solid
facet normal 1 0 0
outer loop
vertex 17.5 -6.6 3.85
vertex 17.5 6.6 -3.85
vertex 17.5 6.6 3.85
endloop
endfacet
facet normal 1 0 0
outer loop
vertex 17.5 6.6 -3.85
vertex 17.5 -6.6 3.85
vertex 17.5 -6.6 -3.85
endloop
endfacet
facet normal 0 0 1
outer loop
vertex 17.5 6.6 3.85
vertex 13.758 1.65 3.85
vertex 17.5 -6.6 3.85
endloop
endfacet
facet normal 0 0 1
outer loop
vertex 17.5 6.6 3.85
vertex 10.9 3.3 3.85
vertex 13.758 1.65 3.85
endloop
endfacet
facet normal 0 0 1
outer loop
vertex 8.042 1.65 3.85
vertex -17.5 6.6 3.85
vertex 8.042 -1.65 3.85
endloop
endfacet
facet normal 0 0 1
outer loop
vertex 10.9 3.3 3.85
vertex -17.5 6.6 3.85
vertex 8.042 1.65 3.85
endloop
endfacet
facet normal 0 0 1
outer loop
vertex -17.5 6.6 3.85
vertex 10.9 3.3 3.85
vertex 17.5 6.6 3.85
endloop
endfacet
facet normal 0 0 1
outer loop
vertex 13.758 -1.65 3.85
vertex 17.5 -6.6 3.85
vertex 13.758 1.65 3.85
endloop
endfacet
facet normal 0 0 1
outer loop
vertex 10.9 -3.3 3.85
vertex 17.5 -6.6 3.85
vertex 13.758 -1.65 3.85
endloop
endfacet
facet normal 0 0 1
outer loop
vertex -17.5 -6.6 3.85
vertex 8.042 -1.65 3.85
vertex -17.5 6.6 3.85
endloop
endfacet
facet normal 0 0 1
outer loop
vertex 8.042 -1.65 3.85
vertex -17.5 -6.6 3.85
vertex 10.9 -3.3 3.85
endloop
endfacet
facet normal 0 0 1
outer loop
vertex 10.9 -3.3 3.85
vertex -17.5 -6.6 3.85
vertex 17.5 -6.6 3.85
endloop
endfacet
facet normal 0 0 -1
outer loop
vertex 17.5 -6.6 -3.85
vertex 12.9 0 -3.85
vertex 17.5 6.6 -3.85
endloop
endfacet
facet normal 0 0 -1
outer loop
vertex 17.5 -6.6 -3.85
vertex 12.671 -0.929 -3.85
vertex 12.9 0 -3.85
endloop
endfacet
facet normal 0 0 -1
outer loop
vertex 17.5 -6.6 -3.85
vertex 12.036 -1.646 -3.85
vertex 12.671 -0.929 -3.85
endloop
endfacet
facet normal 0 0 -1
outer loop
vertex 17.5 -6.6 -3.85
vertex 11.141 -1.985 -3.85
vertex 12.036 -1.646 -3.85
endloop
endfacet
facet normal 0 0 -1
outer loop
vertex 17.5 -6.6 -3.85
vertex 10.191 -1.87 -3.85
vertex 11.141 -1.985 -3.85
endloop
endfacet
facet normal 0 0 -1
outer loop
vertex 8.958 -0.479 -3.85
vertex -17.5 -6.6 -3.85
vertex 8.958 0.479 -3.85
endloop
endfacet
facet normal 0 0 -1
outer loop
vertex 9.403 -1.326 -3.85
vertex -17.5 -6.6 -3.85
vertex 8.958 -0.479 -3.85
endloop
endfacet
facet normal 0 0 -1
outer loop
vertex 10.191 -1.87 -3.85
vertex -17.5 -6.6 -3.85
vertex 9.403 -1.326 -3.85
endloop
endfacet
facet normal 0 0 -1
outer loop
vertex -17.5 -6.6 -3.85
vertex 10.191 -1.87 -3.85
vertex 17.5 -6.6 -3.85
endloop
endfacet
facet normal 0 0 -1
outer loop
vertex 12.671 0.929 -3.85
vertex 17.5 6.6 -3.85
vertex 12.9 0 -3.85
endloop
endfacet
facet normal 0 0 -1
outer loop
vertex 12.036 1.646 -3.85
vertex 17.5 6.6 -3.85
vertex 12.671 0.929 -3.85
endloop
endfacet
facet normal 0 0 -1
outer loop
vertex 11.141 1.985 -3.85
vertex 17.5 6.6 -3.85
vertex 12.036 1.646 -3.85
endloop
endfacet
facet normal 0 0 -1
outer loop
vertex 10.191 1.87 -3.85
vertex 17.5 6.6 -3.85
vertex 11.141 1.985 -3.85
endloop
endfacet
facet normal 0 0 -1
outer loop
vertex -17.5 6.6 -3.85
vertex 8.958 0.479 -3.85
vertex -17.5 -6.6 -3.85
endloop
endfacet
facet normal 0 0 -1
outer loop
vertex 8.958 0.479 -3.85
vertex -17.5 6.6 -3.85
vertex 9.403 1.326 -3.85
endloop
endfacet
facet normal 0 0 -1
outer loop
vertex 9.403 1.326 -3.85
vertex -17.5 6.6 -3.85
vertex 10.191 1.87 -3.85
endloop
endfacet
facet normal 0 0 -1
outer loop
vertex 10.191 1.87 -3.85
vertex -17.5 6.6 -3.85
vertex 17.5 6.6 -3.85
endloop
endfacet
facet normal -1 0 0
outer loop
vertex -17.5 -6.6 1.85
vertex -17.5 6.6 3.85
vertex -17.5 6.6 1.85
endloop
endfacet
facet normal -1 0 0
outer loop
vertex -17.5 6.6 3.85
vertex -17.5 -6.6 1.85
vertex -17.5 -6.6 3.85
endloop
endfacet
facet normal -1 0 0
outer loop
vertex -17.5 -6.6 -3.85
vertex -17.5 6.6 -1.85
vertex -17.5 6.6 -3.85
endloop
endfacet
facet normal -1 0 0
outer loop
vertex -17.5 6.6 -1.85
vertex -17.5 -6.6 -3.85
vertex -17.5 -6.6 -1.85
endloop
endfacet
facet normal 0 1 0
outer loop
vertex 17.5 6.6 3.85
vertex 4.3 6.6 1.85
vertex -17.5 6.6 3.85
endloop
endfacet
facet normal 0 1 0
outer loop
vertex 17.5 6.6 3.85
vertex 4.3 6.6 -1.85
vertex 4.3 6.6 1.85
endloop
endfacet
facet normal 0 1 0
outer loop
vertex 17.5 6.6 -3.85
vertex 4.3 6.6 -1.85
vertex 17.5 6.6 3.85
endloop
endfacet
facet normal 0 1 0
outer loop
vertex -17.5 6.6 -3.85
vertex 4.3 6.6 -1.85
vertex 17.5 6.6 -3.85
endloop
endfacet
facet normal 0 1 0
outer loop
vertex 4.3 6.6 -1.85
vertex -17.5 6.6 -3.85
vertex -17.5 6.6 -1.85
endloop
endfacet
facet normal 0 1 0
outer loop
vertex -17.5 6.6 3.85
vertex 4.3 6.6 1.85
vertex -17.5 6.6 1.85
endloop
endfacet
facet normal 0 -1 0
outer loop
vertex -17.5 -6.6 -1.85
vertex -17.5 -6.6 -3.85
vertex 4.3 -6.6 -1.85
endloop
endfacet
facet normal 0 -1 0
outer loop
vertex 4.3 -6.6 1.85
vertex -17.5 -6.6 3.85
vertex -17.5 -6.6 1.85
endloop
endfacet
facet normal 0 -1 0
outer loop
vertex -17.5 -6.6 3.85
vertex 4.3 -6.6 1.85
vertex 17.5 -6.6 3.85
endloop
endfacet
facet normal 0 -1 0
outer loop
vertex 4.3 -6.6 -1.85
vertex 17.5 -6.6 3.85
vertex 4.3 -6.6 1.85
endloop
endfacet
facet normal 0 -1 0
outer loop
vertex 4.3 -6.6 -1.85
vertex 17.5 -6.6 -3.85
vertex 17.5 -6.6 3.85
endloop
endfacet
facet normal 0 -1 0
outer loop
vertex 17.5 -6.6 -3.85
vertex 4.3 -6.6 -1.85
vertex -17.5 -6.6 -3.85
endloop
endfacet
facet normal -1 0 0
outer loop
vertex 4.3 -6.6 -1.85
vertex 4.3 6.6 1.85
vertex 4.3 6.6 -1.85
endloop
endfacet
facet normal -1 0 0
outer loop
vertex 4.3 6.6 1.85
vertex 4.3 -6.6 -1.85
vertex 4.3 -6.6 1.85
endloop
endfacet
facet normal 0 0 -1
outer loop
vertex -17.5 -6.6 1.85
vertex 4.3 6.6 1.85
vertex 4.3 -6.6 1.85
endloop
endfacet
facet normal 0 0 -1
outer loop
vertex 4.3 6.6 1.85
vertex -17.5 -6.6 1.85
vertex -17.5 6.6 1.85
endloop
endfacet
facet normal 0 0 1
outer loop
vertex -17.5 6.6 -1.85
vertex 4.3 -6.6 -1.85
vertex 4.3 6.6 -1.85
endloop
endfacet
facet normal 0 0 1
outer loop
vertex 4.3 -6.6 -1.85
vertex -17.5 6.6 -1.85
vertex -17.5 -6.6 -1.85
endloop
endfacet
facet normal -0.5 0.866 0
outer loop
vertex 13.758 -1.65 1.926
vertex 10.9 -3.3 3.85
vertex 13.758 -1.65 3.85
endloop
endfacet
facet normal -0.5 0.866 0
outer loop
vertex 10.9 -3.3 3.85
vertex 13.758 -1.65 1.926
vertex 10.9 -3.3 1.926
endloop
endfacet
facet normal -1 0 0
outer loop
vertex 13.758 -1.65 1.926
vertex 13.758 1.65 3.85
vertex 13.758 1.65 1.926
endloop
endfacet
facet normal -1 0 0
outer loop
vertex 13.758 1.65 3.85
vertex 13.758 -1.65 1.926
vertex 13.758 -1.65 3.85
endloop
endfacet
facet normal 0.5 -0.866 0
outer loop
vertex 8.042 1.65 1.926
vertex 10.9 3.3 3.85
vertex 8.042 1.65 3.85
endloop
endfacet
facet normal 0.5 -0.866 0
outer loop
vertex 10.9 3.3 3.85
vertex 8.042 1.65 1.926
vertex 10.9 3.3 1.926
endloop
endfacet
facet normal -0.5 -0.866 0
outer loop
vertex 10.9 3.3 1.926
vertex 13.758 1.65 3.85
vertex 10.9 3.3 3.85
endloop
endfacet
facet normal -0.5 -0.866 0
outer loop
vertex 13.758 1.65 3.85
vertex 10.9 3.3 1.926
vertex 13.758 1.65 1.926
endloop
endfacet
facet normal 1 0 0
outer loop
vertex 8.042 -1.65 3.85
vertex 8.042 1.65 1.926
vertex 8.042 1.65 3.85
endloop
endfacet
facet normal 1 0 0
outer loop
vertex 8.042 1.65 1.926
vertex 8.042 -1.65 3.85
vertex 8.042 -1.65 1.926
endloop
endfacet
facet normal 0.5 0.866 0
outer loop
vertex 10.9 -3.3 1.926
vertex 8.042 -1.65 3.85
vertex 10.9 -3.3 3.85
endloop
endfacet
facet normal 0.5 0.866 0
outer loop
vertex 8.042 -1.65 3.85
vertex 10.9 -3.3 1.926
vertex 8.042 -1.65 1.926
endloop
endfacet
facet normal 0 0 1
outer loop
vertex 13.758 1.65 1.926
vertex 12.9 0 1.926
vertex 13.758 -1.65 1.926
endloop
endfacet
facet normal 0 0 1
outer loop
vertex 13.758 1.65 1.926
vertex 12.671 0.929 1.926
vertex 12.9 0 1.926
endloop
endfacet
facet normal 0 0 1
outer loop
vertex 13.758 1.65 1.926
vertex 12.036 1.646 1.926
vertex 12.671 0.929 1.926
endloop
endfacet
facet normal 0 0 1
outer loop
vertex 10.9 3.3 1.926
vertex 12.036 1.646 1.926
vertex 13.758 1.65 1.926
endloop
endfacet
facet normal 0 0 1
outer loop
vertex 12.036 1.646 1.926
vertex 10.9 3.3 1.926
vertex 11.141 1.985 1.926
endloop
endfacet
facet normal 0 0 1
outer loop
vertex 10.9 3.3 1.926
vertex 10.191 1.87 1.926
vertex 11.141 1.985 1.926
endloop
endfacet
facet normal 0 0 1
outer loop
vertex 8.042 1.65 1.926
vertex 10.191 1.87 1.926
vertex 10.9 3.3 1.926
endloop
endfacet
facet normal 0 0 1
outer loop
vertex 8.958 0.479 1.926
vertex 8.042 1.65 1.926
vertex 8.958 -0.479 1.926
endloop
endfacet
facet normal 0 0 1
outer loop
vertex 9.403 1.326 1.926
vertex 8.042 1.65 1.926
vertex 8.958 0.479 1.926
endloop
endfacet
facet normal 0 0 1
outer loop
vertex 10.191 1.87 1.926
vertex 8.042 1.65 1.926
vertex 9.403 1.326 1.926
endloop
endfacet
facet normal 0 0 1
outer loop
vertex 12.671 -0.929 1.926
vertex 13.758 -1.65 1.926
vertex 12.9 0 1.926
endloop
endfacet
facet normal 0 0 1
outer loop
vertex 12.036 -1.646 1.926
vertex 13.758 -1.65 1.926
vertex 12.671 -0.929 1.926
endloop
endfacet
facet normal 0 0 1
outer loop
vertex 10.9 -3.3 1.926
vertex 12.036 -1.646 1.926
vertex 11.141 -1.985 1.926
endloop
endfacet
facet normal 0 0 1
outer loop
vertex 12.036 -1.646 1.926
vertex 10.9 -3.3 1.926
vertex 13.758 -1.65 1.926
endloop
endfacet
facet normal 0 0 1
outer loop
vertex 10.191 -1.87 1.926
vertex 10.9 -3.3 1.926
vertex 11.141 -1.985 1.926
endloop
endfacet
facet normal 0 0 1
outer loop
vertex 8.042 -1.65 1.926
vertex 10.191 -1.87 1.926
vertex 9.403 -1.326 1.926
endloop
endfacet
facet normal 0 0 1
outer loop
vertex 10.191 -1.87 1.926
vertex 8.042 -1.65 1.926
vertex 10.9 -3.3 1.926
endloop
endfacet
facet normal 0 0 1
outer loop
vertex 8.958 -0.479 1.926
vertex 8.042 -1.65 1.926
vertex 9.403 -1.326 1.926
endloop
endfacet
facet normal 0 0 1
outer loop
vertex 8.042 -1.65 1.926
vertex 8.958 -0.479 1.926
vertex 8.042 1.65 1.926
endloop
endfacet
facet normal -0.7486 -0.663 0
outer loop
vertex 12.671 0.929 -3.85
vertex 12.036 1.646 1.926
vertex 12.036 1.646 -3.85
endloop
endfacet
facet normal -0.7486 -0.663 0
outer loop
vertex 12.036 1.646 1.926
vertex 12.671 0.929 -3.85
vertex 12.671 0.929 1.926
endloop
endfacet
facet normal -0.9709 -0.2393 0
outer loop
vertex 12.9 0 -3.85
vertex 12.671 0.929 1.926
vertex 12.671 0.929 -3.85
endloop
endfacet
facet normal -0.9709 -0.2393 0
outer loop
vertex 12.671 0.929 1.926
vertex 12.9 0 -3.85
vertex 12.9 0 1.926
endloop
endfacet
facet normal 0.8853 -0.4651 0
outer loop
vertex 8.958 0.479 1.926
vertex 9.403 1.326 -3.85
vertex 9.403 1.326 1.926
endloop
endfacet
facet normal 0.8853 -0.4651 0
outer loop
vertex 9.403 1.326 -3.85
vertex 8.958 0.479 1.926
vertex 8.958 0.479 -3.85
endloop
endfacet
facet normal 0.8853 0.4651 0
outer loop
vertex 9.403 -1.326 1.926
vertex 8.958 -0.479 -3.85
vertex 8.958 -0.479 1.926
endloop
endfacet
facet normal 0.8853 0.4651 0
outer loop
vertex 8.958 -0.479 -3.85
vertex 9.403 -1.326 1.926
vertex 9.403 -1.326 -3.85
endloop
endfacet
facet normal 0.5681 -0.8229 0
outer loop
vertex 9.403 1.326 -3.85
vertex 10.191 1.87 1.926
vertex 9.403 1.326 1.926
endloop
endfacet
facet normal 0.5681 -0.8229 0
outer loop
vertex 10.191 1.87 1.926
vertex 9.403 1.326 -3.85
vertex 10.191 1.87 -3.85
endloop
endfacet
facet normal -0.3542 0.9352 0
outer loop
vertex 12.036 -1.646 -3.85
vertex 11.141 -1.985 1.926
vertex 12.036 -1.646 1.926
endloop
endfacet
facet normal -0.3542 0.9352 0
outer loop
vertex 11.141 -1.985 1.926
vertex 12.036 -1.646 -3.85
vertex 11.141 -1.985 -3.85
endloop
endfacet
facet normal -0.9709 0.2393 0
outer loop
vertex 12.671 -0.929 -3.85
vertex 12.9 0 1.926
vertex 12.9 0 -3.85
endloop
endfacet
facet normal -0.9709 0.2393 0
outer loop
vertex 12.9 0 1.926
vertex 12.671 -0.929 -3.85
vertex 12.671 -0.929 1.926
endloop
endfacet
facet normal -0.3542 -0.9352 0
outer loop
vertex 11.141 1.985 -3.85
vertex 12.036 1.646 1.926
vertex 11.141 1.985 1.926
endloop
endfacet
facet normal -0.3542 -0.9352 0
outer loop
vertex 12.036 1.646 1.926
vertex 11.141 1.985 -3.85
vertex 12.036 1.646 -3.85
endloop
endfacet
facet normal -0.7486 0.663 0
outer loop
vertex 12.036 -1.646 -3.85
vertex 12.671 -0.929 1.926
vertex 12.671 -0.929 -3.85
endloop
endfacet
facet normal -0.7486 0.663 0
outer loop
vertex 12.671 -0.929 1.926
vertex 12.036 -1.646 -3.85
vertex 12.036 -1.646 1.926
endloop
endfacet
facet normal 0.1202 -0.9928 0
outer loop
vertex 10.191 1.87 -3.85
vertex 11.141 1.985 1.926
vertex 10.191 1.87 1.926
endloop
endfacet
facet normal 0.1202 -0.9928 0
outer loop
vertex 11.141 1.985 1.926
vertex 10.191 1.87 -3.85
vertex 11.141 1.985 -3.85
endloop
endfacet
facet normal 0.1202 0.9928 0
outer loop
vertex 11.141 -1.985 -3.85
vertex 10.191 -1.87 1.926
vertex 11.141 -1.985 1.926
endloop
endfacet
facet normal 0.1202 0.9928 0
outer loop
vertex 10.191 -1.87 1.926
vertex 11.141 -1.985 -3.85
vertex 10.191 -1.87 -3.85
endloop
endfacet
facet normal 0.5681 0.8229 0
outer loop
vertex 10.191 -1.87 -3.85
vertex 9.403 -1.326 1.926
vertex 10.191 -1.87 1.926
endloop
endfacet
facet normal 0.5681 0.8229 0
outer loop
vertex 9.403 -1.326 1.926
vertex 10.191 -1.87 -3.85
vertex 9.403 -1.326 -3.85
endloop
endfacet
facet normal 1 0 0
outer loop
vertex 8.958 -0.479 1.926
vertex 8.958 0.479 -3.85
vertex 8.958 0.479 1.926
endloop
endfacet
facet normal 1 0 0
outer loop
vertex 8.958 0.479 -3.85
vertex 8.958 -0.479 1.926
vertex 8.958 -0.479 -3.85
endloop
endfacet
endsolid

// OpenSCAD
board_t=3.7;
bracket_t=board_t+(.8*5);
m3_nut_r = 6.6/2;
m3_slot=3.5;
tongue=35;
nut_h=4;
m3=4;
ep=0.001;
$fa=1;
$fs=1;
module clip()
{
    difference()
    {
        cube([tongue,m3_nut_r*2*2,bracket_t],center=true);
        translate([-(m3_nut_r*2*2),0,0])cube([tongue,m3_nut_r*2*3,board_t],center=true);
        translate([(tongue/2-m3_nut_r*2),0,(bracket_t/2-bracket_t/8)+ep])rotate([0,0,30])cylinder(r1=m3_nut_r,r2=m3_nut_r,h=bracket_t/4,center=true,$fn=6);
        translate([(tongue/2-m3_nut_r*2),0,0])cylinder(r1=m3/2,r2=m3/2,h=bracket_t*2,center=true);
    }
}
//translate([(tongue/2-m3_nut_r*2),0,0])cube([m3_nut_r,m3_nut_r,bracket_t*2],center=true);

module thumb()
{
    difference()
    {
        union()
        {
            cylinder(r=2.4+(m3_nut_r), h=nut_h*2,center=true);
            translate([0,0,-nut_h*.5])cylinder(r=3.6+(m3_nut_r), h=nut_h,center=true);
        }
        translate([0,0,nut_h/2+ep])cylinder(r=m3_nut_r,h=nut_h*2,center=true,$fn=6);
    }
    translate([0,0,-(nut_h+.5-ep)])cylinder(r1=2*(m3_nut_r)-1,r2=2*(m3_nut_r), h=1,center=true);
}

//thumb();
clip();
